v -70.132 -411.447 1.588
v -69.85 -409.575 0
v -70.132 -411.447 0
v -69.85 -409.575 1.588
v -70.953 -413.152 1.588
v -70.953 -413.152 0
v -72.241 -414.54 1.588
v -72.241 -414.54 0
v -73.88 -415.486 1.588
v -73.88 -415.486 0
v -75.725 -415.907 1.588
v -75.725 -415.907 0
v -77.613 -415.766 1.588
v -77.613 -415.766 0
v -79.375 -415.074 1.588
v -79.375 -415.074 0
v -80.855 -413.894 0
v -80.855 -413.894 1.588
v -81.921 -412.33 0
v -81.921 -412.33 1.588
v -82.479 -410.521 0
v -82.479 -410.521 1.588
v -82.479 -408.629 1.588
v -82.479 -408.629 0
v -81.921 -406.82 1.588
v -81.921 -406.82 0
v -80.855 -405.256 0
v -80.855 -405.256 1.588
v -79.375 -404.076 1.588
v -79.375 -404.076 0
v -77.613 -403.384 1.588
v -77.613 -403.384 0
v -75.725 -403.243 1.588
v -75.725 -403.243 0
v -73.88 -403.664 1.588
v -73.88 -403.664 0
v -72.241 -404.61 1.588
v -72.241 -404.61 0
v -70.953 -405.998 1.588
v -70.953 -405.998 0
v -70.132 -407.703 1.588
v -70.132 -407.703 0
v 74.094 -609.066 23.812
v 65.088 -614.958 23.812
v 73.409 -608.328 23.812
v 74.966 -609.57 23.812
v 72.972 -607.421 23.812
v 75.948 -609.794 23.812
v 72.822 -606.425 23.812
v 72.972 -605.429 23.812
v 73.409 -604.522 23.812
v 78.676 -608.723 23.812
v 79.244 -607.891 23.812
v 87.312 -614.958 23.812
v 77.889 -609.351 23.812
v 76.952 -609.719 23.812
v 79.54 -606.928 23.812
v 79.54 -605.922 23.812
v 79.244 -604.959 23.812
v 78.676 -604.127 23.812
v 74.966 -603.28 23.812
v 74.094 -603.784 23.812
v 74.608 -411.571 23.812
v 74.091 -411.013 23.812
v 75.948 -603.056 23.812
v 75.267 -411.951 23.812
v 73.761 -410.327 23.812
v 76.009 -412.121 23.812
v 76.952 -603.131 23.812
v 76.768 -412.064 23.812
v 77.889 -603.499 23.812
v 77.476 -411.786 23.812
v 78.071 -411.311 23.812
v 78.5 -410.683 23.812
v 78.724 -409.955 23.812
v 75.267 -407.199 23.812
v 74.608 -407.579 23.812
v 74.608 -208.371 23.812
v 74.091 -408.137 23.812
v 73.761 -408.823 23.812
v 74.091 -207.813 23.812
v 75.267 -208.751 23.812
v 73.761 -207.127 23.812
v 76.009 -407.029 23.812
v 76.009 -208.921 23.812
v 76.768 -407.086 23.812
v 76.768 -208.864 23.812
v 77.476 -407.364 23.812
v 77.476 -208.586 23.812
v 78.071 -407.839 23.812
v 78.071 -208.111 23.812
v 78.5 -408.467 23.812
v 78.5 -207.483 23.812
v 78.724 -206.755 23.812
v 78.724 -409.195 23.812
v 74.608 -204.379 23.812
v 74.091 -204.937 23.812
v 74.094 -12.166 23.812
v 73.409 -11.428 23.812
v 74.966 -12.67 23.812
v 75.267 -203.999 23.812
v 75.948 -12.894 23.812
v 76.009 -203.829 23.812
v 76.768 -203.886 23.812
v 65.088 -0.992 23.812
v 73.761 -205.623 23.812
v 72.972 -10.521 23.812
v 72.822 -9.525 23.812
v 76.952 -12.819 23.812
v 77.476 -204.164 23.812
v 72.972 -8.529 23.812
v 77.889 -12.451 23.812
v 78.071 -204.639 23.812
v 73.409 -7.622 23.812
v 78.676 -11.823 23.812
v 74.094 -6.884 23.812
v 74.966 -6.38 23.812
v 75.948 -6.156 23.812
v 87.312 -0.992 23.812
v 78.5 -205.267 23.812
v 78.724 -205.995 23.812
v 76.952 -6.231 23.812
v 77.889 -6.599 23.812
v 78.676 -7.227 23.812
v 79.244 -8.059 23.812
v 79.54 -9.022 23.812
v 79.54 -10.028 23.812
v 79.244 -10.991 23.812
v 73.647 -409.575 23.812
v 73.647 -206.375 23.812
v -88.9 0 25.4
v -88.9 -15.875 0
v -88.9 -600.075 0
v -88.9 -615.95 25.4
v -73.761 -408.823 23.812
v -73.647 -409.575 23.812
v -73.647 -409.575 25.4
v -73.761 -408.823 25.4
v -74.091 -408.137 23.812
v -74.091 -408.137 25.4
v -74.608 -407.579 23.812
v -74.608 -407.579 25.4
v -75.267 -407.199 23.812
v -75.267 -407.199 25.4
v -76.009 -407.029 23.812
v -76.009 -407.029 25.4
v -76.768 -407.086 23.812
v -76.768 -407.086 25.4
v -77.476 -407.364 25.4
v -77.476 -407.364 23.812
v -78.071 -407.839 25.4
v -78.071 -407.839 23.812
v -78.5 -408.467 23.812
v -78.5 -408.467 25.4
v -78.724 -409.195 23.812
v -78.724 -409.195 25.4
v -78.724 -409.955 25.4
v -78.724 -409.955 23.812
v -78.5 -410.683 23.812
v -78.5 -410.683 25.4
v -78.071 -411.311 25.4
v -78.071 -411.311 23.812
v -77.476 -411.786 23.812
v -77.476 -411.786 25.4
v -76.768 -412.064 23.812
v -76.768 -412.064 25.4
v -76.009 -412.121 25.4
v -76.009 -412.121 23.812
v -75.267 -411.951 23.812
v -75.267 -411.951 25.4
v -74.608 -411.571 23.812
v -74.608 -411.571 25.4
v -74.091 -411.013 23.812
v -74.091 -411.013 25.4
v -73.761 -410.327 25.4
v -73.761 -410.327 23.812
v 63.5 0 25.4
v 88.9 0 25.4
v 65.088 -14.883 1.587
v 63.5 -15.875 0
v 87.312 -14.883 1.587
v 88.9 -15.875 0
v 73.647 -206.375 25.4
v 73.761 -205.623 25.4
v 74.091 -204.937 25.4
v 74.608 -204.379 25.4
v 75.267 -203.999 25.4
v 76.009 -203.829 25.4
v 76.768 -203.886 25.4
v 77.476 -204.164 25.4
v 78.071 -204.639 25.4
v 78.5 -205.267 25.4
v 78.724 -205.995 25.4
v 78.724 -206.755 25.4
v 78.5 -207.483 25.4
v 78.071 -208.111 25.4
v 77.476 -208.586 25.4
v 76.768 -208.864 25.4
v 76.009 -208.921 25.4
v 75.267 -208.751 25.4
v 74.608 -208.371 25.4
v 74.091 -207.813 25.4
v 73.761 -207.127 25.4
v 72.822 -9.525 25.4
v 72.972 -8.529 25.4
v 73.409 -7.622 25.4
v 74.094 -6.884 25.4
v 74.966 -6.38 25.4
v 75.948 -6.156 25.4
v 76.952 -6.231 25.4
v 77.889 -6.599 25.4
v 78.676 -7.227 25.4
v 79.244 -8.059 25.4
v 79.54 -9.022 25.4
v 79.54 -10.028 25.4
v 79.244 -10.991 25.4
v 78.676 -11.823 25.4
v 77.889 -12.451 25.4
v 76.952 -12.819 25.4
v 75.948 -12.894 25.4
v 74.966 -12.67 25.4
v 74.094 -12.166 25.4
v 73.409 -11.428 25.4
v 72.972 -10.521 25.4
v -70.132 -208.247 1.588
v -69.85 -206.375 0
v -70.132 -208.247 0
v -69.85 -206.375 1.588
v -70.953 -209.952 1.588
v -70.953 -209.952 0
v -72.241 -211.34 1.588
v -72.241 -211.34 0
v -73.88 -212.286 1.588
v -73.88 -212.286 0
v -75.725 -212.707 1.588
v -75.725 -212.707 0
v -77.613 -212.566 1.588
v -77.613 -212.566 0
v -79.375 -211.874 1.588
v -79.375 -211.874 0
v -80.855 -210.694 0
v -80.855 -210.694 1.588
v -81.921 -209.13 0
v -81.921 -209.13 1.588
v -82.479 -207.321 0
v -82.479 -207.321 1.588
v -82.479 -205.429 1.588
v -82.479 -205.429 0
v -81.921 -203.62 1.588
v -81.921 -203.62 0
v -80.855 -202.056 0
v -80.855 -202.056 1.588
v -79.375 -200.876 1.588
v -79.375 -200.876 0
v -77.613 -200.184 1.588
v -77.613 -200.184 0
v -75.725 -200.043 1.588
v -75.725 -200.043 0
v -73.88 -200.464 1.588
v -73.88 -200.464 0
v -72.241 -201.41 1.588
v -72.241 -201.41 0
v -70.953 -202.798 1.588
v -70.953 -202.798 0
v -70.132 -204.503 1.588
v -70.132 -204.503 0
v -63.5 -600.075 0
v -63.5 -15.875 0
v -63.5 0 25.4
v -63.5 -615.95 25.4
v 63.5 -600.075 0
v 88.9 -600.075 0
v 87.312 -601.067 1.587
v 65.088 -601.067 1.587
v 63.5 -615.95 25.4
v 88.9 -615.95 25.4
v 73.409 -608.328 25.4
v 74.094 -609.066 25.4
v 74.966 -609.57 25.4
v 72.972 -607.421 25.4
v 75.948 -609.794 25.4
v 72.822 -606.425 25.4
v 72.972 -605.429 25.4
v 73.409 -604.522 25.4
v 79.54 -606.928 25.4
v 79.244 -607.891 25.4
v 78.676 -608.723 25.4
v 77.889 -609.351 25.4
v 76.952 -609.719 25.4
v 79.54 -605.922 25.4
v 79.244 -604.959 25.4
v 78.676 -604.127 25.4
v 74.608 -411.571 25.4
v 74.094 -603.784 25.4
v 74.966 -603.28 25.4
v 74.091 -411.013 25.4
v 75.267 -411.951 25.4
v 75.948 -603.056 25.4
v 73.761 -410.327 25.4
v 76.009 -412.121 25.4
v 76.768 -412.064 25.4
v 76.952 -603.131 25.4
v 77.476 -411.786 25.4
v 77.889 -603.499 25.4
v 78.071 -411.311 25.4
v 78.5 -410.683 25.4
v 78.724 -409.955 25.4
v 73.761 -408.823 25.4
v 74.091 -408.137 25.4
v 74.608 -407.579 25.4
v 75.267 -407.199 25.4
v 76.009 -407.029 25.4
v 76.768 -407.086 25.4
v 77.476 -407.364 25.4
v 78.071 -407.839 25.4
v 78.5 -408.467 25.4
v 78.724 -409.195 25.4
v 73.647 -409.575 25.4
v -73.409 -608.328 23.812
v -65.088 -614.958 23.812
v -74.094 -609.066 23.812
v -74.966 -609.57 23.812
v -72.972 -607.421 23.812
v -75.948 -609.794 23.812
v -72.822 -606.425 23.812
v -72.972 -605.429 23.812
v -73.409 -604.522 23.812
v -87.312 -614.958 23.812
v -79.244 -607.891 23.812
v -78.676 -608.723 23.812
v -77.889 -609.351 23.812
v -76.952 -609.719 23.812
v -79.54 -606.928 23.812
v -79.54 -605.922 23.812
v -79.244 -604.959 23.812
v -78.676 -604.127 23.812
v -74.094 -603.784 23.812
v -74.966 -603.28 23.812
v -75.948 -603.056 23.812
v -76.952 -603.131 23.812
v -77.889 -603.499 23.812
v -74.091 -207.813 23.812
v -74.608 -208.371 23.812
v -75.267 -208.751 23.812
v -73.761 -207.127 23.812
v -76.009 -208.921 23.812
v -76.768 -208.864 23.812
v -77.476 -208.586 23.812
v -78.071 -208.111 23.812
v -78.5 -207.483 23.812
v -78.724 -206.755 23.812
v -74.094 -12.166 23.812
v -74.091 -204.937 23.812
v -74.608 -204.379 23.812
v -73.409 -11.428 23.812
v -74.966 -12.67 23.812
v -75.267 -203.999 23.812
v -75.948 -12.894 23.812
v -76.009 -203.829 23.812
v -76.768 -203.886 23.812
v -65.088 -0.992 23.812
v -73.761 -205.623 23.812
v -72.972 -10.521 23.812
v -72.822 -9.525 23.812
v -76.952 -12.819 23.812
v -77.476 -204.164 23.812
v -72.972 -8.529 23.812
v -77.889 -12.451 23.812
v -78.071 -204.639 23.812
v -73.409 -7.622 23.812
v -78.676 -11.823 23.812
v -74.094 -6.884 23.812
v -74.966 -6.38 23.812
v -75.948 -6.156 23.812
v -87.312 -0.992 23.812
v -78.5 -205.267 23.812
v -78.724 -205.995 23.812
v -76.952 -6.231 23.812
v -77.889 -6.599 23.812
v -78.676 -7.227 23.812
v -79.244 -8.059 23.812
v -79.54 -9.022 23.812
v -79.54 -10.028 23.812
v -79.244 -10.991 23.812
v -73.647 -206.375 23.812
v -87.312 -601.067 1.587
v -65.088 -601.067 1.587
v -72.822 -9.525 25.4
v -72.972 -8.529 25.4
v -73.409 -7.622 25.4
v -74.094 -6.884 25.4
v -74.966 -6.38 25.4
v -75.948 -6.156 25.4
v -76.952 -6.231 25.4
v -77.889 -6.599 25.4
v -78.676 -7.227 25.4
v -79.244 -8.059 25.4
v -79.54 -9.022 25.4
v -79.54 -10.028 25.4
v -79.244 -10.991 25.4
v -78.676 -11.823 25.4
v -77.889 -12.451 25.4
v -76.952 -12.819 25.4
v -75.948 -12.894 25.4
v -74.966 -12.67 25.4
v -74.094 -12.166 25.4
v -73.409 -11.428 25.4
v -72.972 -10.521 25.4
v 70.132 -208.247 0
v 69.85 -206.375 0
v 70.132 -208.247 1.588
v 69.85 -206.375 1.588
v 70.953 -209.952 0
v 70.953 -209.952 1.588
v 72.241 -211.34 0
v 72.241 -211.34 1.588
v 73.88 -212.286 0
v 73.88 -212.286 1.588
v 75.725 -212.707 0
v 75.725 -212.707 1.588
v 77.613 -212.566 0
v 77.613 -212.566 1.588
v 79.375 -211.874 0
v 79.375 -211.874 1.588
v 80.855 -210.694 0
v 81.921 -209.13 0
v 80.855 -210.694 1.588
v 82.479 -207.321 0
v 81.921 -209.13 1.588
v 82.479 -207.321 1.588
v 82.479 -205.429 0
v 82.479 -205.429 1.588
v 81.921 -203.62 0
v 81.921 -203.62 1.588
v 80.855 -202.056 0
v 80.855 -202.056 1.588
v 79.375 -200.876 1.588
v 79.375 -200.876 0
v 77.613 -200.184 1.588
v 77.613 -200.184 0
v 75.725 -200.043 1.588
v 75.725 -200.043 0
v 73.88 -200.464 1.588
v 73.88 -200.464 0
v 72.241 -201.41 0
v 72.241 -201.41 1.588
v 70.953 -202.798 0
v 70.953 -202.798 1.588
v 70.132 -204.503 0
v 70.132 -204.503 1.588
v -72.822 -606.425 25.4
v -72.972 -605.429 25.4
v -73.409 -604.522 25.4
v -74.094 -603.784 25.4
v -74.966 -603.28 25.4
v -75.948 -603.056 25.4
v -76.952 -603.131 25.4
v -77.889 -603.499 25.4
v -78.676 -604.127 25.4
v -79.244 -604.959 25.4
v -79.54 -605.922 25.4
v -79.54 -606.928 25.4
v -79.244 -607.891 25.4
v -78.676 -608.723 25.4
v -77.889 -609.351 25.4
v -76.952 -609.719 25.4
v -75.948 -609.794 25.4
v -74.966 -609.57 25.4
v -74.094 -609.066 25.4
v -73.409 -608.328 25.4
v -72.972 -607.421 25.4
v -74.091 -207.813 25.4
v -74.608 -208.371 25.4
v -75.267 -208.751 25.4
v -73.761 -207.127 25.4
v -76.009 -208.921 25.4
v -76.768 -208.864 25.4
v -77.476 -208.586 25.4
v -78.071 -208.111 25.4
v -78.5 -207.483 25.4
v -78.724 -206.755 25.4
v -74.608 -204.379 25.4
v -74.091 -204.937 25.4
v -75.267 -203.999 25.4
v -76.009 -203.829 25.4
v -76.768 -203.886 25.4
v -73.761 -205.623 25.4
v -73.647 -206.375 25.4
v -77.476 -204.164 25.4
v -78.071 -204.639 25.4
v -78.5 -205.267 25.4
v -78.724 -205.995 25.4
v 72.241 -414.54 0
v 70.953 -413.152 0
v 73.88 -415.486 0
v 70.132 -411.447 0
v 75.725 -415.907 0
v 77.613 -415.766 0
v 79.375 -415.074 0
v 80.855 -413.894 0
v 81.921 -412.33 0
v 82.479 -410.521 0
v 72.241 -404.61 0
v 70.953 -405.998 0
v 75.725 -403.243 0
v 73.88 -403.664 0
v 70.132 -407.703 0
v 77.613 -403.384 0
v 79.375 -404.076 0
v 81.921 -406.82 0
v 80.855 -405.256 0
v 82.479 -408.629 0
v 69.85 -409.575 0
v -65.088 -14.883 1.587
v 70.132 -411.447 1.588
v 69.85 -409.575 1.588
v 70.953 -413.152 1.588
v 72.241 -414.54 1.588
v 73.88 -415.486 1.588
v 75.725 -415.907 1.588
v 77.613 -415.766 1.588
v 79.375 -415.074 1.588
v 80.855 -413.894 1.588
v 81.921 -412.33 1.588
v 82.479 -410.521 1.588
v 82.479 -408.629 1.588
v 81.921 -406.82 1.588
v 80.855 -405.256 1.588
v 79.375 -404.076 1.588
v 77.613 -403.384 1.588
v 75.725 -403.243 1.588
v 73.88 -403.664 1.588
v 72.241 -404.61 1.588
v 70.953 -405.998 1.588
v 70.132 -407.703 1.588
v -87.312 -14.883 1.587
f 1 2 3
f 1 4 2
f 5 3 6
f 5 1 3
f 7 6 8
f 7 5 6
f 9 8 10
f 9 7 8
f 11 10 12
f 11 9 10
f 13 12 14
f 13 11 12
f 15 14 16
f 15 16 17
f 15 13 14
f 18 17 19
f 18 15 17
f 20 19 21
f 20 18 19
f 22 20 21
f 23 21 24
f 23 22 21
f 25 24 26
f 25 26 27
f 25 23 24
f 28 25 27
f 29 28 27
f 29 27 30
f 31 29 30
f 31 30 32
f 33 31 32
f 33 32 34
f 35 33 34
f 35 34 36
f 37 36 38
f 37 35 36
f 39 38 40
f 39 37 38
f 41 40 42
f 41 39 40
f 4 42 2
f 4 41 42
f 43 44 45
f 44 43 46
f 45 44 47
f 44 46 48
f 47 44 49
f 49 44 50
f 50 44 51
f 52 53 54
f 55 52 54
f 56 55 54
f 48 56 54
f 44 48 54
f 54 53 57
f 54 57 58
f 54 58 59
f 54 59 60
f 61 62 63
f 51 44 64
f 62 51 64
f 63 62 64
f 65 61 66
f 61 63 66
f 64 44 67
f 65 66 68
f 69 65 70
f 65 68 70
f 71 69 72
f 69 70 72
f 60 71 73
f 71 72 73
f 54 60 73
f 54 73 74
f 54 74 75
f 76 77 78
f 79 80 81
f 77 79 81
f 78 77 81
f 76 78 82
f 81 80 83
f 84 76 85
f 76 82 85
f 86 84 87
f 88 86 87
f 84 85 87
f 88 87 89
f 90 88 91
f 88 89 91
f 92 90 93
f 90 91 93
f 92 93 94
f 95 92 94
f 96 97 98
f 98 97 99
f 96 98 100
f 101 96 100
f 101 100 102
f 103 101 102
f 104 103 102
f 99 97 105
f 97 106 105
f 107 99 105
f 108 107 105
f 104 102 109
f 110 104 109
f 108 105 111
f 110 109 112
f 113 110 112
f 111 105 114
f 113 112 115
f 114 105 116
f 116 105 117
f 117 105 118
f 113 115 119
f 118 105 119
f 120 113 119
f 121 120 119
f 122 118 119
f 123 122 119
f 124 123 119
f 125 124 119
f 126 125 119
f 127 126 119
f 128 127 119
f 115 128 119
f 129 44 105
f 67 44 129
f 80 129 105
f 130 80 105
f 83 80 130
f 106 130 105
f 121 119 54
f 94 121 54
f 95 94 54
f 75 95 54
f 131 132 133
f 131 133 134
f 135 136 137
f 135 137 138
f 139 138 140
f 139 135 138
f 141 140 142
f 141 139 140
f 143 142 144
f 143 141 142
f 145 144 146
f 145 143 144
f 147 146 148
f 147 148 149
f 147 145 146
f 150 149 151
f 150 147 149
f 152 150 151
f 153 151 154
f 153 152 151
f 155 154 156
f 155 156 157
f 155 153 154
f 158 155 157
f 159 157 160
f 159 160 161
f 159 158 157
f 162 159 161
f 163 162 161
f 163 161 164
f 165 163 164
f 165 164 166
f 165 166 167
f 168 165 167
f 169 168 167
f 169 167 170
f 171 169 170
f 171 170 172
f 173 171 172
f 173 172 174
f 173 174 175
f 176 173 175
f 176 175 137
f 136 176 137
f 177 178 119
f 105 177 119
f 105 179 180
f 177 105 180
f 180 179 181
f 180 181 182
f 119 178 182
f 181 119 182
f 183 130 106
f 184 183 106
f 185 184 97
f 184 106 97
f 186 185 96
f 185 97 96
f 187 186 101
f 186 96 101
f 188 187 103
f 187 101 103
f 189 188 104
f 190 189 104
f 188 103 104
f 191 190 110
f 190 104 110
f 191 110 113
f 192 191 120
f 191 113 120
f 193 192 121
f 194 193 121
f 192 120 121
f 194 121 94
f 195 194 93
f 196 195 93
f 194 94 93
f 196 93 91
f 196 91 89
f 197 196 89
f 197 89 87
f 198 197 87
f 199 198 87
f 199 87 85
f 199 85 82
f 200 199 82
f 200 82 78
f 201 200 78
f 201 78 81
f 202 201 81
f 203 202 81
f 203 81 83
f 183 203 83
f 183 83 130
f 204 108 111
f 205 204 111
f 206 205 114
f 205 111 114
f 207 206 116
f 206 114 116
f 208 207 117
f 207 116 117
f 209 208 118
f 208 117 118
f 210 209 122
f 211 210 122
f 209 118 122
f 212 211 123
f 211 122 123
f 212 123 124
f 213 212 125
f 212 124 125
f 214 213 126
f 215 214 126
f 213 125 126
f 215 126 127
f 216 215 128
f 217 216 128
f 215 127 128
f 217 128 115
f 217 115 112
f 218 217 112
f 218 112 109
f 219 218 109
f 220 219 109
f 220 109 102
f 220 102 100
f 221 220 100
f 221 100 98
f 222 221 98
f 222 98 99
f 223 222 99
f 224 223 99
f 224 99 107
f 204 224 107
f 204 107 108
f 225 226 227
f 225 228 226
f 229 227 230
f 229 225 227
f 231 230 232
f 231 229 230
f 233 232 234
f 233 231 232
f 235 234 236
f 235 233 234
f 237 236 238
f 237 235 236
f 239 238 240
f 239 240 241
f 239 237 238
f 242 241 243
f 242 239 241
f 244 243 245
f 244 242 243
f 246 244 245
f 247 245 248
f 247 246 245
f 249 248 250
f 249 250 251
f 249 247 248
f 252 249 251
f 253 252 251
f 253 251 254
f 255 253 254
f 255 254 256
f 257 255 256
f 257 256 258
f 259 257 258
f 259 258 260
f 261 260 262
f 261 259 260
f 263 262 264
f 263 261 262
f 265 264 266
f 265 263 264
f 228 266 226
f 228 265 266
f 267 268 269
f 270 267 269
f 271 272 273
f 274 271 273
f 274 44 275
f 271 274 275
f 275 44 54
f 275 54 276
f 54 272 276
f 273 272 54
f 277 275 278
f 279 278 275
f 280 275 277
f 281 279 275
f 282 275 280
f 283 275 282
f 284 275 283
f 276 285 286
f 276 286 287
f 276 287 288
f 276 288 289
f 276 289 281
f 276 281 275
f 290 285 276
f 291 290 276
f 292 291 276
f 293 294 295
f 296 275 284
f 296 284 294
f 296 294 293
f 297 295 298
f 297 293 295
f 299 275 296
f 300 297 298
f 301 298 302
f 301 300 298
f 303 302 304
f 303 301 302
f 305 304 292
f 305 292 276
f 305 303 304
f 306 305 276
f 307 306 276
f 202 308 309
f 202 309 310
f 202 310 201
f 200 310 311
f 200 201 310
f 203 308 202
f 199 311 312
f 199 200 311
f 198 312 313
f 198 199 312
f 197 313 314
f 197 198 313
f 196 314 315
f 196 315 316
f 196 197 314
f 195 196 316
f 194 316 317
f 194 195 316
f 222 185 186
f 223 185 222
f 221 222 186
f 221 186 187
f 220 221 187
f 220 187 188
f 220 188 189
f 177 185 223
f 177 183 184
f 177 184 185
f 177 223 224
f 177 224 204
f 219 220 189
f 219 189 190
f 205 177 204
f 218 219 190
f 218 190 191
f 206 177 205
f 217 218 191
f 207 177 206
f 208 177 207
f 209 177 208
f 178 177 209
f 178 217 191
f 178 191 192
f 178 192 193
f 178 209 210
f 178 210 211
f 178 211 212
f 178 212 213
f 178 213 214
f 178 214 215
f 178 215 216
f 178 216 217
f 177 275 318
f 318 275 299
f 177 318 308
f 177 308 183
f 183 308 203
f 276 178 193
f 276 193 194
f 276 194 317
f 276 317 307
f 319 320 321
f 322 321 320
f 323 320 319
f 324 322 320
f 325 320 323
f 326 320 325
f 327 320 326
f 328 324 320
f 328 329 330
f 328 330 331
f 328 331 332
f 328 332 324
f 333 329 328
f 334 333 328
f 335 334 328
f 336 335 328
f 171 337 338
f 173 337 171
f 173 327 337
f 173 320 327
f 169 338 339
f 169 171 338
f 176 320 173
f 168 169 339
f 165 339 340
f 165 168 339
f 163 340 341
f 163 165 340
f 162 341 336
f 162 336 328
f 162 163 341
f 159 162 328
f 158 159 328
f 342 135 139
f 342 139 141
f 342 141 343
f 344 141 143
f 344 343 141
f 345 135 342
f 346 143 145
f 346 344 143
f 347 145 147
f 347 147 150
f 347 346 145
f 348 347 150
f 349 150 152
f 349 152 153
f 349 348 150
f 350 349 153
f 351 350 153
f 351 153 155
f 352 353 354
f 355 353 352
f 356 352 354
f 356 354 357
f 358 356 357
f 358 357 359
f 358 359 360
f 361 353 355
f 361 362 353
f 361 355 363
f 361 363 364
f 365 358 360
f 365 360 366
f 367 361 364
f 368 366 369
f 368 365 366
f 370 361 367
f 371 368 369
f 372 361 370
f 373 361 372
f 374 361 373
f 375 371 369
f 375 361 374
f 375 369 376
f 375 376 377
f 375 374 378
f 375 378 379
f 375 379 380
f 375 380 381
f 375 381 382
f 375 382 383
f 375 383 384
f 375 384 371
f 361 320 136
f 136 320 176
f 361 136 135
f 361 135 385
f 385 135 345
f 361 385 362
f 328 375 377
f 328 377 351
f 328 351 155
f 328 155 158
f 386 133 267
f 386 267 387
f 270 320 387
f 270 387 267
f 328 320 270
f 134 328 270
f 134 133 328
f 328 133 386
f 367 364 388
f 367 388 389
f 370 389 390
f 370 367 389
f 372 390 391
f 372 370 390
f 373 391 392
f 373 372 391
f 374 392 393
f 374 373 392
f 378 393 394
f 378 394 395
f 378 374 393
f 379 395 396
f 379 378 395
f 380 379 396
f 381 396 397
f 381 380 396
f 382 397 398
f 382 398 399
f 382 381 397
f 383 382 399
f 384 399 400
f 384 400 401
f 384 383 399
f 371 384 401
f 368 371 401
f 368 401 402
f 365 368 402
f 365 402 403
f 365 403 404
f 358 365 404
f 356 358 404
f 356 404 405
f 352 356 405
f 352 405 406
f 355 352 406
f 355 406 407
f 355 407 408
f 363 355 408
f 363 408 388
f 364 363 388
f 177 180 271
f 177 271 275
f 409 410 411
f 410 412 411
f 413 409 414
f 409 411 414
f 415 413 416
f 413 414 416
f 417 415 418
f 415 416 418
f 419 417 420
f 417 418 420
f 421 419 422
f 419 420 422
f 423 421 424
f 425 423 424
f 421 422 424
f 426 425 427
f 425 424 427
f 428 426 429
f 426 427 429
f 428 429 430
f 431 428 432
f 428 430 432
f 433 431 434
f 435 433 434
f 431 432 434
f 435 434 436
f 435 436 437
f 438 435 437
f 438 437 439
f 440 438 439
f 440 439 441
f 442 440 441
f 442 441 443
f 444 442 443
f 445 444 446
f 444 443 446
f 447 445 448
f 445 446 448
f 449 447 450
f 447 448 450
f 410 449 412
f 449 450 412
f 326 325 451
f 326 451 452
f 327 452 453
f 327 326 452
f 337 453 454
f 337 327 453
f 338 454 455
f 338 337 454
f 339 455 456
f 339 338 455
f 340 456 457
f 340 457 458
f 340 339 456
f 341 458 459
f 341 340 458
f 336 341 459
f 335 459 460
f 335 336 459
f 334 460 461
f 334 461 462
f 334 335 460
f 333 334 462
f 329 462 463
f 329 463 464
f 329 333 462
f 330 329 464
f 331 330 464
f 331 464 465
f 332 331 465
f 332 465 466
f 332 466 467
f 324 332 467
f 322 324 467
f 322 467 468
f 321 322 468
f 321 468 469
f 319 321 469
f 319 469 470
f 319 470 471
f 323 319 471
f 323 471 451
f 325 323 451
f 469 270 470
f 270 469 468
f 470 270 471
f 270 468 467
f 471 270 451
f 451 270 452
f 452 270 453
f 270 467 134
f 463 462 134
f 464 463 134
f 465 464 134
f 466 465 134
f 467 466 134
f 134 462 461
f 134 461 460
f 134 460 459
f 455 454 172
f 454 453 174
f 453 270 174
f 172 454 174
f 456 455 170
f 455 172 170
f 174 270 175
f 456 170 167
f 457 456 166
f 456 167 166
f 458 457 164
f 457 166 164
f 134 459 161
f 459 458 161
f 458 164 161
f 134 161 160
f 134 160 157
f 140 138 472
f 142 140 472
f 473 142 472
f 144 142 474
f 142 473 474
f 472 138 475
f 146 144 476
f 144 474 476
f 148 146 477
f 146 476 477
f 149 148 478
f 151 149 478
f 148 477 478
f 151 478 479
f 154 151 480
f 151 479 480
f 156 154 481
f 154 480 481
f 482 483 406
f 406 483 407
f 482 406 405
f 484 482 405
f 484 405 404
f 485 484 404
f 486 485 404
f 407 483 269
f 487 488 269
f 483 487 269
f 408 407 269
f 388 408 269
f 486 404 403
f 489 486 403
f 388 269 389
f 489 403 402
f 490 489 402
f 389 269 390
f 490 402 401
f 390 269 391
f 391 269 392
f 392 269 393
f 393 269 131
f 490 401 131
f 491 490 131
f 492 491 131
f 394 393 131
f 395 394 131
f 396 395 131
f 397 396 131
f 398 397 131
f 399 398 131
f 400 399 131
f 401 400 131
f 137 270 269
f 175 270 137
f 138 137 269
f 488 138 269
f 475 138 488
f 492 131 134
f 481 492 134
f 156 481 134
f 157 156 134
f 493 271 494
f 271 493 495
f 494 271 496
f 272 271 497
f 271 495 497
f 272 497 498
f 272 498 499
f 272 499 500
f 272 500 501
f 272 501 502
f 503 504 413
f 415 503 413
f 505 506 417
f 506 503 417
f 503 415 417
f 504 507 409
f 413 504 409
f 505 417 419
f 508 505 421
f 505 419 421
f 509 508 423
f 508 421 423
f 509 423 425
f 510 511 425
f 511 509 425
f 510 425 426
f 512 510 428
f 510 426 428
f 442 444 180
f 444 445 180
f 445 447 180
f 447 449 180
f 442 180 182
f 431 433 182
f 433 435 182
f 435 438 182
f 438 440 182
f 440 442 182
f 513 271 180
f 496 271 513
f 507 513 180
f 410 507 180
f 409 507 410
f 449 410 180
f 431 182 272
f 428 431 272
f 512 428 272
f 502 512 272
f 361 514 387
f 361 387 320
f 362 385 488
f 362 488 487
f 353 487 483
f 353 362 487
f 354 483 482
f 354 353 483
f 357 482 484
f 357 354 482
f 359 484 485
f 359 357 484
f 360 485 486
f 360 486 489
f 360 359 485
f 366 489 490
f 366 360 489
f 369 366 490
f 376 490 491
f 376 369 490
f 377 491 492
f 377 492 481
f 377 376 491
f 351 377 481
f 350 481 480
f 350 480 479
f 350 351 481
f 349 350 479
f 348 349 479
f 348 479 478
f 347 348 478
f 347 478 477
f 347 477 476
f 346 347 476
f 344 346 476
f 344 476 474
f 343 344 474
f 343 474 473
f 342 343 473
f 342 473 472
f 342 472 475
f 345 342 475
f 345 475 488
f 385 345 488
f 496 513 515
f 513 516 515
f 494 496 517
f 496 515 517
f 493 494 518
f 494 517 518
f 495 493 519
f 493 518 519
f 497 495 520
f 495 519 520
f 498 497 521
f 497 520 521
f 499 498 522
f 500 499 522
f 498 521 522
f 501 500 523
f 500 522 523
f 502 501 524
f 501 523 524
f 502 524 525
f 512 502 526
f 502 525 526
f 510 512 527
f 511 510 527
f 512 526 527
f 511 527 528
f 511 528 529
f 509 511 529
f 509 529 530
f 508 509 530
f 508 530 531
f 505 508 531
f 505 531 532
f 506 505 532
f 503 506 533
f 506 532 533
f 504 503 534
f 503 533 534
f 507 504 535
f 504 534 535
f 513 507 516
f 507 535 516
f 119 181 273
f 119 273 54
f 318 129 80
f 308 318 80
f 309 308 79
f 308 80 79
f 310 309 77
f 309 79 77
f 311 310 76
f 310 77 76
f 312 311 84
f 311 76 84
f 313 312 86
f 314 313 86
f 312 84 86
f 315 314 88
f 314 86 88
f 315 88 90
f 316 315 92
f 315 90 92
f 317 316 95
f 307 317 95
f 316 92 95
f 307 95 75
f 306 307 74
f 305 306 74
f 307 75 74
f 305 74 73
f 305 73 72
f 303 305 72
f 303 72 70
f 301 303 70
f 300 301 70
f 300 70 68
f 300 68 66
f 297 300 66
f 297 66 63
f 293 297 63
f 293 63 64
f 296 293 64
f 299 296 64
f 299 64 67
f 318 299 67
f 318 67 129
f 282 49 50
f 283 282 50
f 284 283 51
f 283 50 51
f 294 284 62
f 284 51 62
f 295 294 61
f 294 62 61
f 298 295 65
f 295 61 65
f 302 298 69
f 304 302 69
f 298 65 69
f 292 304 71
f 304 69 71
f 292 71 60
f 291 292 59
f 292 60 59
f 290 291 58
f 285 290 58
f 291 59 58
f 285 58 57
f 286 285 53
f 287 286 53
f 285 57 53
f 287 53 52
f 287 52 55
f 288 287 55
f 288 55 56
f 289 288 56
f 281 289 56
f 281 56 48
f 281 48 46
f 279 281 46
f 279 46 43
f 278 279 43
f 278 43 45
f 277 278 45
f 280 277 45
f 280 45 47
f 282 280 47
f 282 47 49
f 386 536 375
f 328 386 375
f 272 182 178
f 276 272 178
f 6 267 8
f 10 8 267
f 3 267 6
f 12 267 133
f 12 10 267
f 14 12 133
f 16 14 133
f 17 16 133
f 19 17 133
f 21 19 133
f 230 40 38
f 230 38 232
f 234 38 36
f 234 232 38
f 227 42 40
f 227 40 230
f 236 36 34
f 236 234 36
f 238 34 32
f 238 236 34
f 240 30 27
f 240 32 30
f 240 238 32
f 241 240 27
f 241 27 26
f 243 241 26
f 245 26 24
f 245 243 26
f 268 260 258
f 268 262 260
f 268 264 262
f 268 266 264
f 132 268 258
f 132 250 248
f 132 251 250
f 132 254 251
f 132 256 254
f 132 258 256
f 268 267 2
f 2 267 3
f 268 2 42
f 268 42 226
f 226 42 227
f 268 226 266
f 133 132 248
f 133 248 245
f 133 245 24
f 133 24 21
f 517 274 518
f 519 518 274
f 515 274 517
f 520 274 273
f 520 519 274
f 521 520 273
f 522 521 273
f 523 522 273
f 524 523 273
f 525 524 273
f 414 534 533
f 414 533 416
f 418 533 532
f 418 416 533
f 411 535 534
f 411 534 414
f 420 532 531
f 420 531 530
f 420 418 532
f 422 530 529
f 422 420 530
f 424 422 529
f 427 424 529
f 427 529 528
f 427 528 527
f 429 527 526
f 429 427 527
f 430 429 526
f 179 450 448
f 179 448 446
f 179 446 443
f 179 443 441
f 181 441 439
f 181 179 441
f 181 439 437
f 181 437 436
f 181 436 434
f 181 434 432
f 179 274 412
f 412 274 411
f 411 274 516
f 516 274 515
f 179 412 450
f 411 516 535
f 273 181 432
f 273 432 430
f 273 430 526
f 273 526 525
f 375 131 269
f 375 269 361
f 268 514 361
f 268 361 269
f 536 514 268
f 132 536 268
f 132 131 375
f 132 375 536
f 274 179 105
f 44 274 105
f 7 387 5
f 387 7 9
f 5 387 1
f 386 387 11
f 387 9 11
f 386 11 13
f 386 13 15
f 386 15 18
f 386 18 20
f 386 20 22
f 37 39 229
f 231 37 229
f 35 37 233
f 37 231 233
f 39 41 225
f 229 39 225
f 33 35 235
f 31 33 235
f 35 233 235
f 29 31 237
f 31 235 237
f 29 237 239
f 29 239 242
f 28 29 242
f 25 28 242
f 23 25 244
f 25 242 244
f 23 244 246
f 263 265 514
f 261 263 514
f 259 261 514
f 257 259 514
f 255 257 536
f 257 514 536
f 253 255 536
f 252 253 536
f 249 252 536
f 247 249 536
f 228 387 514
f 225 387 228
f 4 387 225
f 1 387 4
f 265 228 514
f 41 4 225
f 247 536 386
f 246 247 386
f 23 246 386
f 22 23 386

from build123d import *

# Parameters (mm, degrees)
F0_W     = 25.4
F0_H     = 25.4
F0_W_2   = 22.225
F0_H_2   = 22.225
F1_DEPTH = 615.95
F3_D     = 5.1054
F5_DEPTH = 25.4
F7_D     = 12.7
F7_DEPTH = 1.5875
F7_TIP   = 3.8154649308
F9_D     = 6.7564


# Not quite as in the source:
# - a length typed as a fraction of an inch, garbled in the dataset ("3 / 203.2 mm" for 3/8 in), is restored
# - a feature names something its author has since deleted; it is built from what else it names


with BuildPart() as f1:
    # F0 (on Front) → F1 (new body)
    with BuildSketch(Plane.XZ):
        with Locations((76.2, 12.7)):
            Rectangle(F0_W, F0_H)
        with Locations((76.2, 12.7)):
            Rectangle(F0_W_2, F0_H_2, mode=Mode.SUBTRACT)
    extrude(amount=F1_DEPTH)

    # F3 (through all)
    with Locations(Plane.XY.offset(25.4)):
        with Locations((76.2, -206.375), (76.2, -409.575)):
            Hole(F3_D / 2)

    # F4 (on face) → F5 (cut)
    with BuildSketch(Plane.YZ.offset(88.9)):
        Polygon((0, 0), (0, 25.4), (-15.875, 0), align=None)
        Polygon((-600.075, 0), (-615.95, 25.4), (-615.95, 0), align=None)
    extrude(amount=-F5_DEPTH, mode=Mode.SUBTRACT)

    # F7
    with Locations(Plane(origin=(0, 0, 0), x_dir=(1, 0, 0), z_dir=(0, 0, -1))):
        with Locations((76.2, 409.575), (76.2, 206.375)):
            Hole(F7_D / 2, depth=F7_DEPTH)
            with Locations((0, 0, -(F7_DEPTH + F7_TIP / 2))):  # 118° drill point
                Cone(0, F7_D / 2, F7_TIP, mode=Mode.SUBTRACT)

    # F9 (through all)
    with Locations(Plane.XY.offset(25.4)):
        with Locations((76.2, -606.425), (76.2, -9.525)):
            Hole(F9_D / 2)


with BuildPart() as f10_1:
    # F10: instance of F1
    add(f1.part.mirror(Plane.YZ))


solid = Compound([f1.part, f10_1.part])
